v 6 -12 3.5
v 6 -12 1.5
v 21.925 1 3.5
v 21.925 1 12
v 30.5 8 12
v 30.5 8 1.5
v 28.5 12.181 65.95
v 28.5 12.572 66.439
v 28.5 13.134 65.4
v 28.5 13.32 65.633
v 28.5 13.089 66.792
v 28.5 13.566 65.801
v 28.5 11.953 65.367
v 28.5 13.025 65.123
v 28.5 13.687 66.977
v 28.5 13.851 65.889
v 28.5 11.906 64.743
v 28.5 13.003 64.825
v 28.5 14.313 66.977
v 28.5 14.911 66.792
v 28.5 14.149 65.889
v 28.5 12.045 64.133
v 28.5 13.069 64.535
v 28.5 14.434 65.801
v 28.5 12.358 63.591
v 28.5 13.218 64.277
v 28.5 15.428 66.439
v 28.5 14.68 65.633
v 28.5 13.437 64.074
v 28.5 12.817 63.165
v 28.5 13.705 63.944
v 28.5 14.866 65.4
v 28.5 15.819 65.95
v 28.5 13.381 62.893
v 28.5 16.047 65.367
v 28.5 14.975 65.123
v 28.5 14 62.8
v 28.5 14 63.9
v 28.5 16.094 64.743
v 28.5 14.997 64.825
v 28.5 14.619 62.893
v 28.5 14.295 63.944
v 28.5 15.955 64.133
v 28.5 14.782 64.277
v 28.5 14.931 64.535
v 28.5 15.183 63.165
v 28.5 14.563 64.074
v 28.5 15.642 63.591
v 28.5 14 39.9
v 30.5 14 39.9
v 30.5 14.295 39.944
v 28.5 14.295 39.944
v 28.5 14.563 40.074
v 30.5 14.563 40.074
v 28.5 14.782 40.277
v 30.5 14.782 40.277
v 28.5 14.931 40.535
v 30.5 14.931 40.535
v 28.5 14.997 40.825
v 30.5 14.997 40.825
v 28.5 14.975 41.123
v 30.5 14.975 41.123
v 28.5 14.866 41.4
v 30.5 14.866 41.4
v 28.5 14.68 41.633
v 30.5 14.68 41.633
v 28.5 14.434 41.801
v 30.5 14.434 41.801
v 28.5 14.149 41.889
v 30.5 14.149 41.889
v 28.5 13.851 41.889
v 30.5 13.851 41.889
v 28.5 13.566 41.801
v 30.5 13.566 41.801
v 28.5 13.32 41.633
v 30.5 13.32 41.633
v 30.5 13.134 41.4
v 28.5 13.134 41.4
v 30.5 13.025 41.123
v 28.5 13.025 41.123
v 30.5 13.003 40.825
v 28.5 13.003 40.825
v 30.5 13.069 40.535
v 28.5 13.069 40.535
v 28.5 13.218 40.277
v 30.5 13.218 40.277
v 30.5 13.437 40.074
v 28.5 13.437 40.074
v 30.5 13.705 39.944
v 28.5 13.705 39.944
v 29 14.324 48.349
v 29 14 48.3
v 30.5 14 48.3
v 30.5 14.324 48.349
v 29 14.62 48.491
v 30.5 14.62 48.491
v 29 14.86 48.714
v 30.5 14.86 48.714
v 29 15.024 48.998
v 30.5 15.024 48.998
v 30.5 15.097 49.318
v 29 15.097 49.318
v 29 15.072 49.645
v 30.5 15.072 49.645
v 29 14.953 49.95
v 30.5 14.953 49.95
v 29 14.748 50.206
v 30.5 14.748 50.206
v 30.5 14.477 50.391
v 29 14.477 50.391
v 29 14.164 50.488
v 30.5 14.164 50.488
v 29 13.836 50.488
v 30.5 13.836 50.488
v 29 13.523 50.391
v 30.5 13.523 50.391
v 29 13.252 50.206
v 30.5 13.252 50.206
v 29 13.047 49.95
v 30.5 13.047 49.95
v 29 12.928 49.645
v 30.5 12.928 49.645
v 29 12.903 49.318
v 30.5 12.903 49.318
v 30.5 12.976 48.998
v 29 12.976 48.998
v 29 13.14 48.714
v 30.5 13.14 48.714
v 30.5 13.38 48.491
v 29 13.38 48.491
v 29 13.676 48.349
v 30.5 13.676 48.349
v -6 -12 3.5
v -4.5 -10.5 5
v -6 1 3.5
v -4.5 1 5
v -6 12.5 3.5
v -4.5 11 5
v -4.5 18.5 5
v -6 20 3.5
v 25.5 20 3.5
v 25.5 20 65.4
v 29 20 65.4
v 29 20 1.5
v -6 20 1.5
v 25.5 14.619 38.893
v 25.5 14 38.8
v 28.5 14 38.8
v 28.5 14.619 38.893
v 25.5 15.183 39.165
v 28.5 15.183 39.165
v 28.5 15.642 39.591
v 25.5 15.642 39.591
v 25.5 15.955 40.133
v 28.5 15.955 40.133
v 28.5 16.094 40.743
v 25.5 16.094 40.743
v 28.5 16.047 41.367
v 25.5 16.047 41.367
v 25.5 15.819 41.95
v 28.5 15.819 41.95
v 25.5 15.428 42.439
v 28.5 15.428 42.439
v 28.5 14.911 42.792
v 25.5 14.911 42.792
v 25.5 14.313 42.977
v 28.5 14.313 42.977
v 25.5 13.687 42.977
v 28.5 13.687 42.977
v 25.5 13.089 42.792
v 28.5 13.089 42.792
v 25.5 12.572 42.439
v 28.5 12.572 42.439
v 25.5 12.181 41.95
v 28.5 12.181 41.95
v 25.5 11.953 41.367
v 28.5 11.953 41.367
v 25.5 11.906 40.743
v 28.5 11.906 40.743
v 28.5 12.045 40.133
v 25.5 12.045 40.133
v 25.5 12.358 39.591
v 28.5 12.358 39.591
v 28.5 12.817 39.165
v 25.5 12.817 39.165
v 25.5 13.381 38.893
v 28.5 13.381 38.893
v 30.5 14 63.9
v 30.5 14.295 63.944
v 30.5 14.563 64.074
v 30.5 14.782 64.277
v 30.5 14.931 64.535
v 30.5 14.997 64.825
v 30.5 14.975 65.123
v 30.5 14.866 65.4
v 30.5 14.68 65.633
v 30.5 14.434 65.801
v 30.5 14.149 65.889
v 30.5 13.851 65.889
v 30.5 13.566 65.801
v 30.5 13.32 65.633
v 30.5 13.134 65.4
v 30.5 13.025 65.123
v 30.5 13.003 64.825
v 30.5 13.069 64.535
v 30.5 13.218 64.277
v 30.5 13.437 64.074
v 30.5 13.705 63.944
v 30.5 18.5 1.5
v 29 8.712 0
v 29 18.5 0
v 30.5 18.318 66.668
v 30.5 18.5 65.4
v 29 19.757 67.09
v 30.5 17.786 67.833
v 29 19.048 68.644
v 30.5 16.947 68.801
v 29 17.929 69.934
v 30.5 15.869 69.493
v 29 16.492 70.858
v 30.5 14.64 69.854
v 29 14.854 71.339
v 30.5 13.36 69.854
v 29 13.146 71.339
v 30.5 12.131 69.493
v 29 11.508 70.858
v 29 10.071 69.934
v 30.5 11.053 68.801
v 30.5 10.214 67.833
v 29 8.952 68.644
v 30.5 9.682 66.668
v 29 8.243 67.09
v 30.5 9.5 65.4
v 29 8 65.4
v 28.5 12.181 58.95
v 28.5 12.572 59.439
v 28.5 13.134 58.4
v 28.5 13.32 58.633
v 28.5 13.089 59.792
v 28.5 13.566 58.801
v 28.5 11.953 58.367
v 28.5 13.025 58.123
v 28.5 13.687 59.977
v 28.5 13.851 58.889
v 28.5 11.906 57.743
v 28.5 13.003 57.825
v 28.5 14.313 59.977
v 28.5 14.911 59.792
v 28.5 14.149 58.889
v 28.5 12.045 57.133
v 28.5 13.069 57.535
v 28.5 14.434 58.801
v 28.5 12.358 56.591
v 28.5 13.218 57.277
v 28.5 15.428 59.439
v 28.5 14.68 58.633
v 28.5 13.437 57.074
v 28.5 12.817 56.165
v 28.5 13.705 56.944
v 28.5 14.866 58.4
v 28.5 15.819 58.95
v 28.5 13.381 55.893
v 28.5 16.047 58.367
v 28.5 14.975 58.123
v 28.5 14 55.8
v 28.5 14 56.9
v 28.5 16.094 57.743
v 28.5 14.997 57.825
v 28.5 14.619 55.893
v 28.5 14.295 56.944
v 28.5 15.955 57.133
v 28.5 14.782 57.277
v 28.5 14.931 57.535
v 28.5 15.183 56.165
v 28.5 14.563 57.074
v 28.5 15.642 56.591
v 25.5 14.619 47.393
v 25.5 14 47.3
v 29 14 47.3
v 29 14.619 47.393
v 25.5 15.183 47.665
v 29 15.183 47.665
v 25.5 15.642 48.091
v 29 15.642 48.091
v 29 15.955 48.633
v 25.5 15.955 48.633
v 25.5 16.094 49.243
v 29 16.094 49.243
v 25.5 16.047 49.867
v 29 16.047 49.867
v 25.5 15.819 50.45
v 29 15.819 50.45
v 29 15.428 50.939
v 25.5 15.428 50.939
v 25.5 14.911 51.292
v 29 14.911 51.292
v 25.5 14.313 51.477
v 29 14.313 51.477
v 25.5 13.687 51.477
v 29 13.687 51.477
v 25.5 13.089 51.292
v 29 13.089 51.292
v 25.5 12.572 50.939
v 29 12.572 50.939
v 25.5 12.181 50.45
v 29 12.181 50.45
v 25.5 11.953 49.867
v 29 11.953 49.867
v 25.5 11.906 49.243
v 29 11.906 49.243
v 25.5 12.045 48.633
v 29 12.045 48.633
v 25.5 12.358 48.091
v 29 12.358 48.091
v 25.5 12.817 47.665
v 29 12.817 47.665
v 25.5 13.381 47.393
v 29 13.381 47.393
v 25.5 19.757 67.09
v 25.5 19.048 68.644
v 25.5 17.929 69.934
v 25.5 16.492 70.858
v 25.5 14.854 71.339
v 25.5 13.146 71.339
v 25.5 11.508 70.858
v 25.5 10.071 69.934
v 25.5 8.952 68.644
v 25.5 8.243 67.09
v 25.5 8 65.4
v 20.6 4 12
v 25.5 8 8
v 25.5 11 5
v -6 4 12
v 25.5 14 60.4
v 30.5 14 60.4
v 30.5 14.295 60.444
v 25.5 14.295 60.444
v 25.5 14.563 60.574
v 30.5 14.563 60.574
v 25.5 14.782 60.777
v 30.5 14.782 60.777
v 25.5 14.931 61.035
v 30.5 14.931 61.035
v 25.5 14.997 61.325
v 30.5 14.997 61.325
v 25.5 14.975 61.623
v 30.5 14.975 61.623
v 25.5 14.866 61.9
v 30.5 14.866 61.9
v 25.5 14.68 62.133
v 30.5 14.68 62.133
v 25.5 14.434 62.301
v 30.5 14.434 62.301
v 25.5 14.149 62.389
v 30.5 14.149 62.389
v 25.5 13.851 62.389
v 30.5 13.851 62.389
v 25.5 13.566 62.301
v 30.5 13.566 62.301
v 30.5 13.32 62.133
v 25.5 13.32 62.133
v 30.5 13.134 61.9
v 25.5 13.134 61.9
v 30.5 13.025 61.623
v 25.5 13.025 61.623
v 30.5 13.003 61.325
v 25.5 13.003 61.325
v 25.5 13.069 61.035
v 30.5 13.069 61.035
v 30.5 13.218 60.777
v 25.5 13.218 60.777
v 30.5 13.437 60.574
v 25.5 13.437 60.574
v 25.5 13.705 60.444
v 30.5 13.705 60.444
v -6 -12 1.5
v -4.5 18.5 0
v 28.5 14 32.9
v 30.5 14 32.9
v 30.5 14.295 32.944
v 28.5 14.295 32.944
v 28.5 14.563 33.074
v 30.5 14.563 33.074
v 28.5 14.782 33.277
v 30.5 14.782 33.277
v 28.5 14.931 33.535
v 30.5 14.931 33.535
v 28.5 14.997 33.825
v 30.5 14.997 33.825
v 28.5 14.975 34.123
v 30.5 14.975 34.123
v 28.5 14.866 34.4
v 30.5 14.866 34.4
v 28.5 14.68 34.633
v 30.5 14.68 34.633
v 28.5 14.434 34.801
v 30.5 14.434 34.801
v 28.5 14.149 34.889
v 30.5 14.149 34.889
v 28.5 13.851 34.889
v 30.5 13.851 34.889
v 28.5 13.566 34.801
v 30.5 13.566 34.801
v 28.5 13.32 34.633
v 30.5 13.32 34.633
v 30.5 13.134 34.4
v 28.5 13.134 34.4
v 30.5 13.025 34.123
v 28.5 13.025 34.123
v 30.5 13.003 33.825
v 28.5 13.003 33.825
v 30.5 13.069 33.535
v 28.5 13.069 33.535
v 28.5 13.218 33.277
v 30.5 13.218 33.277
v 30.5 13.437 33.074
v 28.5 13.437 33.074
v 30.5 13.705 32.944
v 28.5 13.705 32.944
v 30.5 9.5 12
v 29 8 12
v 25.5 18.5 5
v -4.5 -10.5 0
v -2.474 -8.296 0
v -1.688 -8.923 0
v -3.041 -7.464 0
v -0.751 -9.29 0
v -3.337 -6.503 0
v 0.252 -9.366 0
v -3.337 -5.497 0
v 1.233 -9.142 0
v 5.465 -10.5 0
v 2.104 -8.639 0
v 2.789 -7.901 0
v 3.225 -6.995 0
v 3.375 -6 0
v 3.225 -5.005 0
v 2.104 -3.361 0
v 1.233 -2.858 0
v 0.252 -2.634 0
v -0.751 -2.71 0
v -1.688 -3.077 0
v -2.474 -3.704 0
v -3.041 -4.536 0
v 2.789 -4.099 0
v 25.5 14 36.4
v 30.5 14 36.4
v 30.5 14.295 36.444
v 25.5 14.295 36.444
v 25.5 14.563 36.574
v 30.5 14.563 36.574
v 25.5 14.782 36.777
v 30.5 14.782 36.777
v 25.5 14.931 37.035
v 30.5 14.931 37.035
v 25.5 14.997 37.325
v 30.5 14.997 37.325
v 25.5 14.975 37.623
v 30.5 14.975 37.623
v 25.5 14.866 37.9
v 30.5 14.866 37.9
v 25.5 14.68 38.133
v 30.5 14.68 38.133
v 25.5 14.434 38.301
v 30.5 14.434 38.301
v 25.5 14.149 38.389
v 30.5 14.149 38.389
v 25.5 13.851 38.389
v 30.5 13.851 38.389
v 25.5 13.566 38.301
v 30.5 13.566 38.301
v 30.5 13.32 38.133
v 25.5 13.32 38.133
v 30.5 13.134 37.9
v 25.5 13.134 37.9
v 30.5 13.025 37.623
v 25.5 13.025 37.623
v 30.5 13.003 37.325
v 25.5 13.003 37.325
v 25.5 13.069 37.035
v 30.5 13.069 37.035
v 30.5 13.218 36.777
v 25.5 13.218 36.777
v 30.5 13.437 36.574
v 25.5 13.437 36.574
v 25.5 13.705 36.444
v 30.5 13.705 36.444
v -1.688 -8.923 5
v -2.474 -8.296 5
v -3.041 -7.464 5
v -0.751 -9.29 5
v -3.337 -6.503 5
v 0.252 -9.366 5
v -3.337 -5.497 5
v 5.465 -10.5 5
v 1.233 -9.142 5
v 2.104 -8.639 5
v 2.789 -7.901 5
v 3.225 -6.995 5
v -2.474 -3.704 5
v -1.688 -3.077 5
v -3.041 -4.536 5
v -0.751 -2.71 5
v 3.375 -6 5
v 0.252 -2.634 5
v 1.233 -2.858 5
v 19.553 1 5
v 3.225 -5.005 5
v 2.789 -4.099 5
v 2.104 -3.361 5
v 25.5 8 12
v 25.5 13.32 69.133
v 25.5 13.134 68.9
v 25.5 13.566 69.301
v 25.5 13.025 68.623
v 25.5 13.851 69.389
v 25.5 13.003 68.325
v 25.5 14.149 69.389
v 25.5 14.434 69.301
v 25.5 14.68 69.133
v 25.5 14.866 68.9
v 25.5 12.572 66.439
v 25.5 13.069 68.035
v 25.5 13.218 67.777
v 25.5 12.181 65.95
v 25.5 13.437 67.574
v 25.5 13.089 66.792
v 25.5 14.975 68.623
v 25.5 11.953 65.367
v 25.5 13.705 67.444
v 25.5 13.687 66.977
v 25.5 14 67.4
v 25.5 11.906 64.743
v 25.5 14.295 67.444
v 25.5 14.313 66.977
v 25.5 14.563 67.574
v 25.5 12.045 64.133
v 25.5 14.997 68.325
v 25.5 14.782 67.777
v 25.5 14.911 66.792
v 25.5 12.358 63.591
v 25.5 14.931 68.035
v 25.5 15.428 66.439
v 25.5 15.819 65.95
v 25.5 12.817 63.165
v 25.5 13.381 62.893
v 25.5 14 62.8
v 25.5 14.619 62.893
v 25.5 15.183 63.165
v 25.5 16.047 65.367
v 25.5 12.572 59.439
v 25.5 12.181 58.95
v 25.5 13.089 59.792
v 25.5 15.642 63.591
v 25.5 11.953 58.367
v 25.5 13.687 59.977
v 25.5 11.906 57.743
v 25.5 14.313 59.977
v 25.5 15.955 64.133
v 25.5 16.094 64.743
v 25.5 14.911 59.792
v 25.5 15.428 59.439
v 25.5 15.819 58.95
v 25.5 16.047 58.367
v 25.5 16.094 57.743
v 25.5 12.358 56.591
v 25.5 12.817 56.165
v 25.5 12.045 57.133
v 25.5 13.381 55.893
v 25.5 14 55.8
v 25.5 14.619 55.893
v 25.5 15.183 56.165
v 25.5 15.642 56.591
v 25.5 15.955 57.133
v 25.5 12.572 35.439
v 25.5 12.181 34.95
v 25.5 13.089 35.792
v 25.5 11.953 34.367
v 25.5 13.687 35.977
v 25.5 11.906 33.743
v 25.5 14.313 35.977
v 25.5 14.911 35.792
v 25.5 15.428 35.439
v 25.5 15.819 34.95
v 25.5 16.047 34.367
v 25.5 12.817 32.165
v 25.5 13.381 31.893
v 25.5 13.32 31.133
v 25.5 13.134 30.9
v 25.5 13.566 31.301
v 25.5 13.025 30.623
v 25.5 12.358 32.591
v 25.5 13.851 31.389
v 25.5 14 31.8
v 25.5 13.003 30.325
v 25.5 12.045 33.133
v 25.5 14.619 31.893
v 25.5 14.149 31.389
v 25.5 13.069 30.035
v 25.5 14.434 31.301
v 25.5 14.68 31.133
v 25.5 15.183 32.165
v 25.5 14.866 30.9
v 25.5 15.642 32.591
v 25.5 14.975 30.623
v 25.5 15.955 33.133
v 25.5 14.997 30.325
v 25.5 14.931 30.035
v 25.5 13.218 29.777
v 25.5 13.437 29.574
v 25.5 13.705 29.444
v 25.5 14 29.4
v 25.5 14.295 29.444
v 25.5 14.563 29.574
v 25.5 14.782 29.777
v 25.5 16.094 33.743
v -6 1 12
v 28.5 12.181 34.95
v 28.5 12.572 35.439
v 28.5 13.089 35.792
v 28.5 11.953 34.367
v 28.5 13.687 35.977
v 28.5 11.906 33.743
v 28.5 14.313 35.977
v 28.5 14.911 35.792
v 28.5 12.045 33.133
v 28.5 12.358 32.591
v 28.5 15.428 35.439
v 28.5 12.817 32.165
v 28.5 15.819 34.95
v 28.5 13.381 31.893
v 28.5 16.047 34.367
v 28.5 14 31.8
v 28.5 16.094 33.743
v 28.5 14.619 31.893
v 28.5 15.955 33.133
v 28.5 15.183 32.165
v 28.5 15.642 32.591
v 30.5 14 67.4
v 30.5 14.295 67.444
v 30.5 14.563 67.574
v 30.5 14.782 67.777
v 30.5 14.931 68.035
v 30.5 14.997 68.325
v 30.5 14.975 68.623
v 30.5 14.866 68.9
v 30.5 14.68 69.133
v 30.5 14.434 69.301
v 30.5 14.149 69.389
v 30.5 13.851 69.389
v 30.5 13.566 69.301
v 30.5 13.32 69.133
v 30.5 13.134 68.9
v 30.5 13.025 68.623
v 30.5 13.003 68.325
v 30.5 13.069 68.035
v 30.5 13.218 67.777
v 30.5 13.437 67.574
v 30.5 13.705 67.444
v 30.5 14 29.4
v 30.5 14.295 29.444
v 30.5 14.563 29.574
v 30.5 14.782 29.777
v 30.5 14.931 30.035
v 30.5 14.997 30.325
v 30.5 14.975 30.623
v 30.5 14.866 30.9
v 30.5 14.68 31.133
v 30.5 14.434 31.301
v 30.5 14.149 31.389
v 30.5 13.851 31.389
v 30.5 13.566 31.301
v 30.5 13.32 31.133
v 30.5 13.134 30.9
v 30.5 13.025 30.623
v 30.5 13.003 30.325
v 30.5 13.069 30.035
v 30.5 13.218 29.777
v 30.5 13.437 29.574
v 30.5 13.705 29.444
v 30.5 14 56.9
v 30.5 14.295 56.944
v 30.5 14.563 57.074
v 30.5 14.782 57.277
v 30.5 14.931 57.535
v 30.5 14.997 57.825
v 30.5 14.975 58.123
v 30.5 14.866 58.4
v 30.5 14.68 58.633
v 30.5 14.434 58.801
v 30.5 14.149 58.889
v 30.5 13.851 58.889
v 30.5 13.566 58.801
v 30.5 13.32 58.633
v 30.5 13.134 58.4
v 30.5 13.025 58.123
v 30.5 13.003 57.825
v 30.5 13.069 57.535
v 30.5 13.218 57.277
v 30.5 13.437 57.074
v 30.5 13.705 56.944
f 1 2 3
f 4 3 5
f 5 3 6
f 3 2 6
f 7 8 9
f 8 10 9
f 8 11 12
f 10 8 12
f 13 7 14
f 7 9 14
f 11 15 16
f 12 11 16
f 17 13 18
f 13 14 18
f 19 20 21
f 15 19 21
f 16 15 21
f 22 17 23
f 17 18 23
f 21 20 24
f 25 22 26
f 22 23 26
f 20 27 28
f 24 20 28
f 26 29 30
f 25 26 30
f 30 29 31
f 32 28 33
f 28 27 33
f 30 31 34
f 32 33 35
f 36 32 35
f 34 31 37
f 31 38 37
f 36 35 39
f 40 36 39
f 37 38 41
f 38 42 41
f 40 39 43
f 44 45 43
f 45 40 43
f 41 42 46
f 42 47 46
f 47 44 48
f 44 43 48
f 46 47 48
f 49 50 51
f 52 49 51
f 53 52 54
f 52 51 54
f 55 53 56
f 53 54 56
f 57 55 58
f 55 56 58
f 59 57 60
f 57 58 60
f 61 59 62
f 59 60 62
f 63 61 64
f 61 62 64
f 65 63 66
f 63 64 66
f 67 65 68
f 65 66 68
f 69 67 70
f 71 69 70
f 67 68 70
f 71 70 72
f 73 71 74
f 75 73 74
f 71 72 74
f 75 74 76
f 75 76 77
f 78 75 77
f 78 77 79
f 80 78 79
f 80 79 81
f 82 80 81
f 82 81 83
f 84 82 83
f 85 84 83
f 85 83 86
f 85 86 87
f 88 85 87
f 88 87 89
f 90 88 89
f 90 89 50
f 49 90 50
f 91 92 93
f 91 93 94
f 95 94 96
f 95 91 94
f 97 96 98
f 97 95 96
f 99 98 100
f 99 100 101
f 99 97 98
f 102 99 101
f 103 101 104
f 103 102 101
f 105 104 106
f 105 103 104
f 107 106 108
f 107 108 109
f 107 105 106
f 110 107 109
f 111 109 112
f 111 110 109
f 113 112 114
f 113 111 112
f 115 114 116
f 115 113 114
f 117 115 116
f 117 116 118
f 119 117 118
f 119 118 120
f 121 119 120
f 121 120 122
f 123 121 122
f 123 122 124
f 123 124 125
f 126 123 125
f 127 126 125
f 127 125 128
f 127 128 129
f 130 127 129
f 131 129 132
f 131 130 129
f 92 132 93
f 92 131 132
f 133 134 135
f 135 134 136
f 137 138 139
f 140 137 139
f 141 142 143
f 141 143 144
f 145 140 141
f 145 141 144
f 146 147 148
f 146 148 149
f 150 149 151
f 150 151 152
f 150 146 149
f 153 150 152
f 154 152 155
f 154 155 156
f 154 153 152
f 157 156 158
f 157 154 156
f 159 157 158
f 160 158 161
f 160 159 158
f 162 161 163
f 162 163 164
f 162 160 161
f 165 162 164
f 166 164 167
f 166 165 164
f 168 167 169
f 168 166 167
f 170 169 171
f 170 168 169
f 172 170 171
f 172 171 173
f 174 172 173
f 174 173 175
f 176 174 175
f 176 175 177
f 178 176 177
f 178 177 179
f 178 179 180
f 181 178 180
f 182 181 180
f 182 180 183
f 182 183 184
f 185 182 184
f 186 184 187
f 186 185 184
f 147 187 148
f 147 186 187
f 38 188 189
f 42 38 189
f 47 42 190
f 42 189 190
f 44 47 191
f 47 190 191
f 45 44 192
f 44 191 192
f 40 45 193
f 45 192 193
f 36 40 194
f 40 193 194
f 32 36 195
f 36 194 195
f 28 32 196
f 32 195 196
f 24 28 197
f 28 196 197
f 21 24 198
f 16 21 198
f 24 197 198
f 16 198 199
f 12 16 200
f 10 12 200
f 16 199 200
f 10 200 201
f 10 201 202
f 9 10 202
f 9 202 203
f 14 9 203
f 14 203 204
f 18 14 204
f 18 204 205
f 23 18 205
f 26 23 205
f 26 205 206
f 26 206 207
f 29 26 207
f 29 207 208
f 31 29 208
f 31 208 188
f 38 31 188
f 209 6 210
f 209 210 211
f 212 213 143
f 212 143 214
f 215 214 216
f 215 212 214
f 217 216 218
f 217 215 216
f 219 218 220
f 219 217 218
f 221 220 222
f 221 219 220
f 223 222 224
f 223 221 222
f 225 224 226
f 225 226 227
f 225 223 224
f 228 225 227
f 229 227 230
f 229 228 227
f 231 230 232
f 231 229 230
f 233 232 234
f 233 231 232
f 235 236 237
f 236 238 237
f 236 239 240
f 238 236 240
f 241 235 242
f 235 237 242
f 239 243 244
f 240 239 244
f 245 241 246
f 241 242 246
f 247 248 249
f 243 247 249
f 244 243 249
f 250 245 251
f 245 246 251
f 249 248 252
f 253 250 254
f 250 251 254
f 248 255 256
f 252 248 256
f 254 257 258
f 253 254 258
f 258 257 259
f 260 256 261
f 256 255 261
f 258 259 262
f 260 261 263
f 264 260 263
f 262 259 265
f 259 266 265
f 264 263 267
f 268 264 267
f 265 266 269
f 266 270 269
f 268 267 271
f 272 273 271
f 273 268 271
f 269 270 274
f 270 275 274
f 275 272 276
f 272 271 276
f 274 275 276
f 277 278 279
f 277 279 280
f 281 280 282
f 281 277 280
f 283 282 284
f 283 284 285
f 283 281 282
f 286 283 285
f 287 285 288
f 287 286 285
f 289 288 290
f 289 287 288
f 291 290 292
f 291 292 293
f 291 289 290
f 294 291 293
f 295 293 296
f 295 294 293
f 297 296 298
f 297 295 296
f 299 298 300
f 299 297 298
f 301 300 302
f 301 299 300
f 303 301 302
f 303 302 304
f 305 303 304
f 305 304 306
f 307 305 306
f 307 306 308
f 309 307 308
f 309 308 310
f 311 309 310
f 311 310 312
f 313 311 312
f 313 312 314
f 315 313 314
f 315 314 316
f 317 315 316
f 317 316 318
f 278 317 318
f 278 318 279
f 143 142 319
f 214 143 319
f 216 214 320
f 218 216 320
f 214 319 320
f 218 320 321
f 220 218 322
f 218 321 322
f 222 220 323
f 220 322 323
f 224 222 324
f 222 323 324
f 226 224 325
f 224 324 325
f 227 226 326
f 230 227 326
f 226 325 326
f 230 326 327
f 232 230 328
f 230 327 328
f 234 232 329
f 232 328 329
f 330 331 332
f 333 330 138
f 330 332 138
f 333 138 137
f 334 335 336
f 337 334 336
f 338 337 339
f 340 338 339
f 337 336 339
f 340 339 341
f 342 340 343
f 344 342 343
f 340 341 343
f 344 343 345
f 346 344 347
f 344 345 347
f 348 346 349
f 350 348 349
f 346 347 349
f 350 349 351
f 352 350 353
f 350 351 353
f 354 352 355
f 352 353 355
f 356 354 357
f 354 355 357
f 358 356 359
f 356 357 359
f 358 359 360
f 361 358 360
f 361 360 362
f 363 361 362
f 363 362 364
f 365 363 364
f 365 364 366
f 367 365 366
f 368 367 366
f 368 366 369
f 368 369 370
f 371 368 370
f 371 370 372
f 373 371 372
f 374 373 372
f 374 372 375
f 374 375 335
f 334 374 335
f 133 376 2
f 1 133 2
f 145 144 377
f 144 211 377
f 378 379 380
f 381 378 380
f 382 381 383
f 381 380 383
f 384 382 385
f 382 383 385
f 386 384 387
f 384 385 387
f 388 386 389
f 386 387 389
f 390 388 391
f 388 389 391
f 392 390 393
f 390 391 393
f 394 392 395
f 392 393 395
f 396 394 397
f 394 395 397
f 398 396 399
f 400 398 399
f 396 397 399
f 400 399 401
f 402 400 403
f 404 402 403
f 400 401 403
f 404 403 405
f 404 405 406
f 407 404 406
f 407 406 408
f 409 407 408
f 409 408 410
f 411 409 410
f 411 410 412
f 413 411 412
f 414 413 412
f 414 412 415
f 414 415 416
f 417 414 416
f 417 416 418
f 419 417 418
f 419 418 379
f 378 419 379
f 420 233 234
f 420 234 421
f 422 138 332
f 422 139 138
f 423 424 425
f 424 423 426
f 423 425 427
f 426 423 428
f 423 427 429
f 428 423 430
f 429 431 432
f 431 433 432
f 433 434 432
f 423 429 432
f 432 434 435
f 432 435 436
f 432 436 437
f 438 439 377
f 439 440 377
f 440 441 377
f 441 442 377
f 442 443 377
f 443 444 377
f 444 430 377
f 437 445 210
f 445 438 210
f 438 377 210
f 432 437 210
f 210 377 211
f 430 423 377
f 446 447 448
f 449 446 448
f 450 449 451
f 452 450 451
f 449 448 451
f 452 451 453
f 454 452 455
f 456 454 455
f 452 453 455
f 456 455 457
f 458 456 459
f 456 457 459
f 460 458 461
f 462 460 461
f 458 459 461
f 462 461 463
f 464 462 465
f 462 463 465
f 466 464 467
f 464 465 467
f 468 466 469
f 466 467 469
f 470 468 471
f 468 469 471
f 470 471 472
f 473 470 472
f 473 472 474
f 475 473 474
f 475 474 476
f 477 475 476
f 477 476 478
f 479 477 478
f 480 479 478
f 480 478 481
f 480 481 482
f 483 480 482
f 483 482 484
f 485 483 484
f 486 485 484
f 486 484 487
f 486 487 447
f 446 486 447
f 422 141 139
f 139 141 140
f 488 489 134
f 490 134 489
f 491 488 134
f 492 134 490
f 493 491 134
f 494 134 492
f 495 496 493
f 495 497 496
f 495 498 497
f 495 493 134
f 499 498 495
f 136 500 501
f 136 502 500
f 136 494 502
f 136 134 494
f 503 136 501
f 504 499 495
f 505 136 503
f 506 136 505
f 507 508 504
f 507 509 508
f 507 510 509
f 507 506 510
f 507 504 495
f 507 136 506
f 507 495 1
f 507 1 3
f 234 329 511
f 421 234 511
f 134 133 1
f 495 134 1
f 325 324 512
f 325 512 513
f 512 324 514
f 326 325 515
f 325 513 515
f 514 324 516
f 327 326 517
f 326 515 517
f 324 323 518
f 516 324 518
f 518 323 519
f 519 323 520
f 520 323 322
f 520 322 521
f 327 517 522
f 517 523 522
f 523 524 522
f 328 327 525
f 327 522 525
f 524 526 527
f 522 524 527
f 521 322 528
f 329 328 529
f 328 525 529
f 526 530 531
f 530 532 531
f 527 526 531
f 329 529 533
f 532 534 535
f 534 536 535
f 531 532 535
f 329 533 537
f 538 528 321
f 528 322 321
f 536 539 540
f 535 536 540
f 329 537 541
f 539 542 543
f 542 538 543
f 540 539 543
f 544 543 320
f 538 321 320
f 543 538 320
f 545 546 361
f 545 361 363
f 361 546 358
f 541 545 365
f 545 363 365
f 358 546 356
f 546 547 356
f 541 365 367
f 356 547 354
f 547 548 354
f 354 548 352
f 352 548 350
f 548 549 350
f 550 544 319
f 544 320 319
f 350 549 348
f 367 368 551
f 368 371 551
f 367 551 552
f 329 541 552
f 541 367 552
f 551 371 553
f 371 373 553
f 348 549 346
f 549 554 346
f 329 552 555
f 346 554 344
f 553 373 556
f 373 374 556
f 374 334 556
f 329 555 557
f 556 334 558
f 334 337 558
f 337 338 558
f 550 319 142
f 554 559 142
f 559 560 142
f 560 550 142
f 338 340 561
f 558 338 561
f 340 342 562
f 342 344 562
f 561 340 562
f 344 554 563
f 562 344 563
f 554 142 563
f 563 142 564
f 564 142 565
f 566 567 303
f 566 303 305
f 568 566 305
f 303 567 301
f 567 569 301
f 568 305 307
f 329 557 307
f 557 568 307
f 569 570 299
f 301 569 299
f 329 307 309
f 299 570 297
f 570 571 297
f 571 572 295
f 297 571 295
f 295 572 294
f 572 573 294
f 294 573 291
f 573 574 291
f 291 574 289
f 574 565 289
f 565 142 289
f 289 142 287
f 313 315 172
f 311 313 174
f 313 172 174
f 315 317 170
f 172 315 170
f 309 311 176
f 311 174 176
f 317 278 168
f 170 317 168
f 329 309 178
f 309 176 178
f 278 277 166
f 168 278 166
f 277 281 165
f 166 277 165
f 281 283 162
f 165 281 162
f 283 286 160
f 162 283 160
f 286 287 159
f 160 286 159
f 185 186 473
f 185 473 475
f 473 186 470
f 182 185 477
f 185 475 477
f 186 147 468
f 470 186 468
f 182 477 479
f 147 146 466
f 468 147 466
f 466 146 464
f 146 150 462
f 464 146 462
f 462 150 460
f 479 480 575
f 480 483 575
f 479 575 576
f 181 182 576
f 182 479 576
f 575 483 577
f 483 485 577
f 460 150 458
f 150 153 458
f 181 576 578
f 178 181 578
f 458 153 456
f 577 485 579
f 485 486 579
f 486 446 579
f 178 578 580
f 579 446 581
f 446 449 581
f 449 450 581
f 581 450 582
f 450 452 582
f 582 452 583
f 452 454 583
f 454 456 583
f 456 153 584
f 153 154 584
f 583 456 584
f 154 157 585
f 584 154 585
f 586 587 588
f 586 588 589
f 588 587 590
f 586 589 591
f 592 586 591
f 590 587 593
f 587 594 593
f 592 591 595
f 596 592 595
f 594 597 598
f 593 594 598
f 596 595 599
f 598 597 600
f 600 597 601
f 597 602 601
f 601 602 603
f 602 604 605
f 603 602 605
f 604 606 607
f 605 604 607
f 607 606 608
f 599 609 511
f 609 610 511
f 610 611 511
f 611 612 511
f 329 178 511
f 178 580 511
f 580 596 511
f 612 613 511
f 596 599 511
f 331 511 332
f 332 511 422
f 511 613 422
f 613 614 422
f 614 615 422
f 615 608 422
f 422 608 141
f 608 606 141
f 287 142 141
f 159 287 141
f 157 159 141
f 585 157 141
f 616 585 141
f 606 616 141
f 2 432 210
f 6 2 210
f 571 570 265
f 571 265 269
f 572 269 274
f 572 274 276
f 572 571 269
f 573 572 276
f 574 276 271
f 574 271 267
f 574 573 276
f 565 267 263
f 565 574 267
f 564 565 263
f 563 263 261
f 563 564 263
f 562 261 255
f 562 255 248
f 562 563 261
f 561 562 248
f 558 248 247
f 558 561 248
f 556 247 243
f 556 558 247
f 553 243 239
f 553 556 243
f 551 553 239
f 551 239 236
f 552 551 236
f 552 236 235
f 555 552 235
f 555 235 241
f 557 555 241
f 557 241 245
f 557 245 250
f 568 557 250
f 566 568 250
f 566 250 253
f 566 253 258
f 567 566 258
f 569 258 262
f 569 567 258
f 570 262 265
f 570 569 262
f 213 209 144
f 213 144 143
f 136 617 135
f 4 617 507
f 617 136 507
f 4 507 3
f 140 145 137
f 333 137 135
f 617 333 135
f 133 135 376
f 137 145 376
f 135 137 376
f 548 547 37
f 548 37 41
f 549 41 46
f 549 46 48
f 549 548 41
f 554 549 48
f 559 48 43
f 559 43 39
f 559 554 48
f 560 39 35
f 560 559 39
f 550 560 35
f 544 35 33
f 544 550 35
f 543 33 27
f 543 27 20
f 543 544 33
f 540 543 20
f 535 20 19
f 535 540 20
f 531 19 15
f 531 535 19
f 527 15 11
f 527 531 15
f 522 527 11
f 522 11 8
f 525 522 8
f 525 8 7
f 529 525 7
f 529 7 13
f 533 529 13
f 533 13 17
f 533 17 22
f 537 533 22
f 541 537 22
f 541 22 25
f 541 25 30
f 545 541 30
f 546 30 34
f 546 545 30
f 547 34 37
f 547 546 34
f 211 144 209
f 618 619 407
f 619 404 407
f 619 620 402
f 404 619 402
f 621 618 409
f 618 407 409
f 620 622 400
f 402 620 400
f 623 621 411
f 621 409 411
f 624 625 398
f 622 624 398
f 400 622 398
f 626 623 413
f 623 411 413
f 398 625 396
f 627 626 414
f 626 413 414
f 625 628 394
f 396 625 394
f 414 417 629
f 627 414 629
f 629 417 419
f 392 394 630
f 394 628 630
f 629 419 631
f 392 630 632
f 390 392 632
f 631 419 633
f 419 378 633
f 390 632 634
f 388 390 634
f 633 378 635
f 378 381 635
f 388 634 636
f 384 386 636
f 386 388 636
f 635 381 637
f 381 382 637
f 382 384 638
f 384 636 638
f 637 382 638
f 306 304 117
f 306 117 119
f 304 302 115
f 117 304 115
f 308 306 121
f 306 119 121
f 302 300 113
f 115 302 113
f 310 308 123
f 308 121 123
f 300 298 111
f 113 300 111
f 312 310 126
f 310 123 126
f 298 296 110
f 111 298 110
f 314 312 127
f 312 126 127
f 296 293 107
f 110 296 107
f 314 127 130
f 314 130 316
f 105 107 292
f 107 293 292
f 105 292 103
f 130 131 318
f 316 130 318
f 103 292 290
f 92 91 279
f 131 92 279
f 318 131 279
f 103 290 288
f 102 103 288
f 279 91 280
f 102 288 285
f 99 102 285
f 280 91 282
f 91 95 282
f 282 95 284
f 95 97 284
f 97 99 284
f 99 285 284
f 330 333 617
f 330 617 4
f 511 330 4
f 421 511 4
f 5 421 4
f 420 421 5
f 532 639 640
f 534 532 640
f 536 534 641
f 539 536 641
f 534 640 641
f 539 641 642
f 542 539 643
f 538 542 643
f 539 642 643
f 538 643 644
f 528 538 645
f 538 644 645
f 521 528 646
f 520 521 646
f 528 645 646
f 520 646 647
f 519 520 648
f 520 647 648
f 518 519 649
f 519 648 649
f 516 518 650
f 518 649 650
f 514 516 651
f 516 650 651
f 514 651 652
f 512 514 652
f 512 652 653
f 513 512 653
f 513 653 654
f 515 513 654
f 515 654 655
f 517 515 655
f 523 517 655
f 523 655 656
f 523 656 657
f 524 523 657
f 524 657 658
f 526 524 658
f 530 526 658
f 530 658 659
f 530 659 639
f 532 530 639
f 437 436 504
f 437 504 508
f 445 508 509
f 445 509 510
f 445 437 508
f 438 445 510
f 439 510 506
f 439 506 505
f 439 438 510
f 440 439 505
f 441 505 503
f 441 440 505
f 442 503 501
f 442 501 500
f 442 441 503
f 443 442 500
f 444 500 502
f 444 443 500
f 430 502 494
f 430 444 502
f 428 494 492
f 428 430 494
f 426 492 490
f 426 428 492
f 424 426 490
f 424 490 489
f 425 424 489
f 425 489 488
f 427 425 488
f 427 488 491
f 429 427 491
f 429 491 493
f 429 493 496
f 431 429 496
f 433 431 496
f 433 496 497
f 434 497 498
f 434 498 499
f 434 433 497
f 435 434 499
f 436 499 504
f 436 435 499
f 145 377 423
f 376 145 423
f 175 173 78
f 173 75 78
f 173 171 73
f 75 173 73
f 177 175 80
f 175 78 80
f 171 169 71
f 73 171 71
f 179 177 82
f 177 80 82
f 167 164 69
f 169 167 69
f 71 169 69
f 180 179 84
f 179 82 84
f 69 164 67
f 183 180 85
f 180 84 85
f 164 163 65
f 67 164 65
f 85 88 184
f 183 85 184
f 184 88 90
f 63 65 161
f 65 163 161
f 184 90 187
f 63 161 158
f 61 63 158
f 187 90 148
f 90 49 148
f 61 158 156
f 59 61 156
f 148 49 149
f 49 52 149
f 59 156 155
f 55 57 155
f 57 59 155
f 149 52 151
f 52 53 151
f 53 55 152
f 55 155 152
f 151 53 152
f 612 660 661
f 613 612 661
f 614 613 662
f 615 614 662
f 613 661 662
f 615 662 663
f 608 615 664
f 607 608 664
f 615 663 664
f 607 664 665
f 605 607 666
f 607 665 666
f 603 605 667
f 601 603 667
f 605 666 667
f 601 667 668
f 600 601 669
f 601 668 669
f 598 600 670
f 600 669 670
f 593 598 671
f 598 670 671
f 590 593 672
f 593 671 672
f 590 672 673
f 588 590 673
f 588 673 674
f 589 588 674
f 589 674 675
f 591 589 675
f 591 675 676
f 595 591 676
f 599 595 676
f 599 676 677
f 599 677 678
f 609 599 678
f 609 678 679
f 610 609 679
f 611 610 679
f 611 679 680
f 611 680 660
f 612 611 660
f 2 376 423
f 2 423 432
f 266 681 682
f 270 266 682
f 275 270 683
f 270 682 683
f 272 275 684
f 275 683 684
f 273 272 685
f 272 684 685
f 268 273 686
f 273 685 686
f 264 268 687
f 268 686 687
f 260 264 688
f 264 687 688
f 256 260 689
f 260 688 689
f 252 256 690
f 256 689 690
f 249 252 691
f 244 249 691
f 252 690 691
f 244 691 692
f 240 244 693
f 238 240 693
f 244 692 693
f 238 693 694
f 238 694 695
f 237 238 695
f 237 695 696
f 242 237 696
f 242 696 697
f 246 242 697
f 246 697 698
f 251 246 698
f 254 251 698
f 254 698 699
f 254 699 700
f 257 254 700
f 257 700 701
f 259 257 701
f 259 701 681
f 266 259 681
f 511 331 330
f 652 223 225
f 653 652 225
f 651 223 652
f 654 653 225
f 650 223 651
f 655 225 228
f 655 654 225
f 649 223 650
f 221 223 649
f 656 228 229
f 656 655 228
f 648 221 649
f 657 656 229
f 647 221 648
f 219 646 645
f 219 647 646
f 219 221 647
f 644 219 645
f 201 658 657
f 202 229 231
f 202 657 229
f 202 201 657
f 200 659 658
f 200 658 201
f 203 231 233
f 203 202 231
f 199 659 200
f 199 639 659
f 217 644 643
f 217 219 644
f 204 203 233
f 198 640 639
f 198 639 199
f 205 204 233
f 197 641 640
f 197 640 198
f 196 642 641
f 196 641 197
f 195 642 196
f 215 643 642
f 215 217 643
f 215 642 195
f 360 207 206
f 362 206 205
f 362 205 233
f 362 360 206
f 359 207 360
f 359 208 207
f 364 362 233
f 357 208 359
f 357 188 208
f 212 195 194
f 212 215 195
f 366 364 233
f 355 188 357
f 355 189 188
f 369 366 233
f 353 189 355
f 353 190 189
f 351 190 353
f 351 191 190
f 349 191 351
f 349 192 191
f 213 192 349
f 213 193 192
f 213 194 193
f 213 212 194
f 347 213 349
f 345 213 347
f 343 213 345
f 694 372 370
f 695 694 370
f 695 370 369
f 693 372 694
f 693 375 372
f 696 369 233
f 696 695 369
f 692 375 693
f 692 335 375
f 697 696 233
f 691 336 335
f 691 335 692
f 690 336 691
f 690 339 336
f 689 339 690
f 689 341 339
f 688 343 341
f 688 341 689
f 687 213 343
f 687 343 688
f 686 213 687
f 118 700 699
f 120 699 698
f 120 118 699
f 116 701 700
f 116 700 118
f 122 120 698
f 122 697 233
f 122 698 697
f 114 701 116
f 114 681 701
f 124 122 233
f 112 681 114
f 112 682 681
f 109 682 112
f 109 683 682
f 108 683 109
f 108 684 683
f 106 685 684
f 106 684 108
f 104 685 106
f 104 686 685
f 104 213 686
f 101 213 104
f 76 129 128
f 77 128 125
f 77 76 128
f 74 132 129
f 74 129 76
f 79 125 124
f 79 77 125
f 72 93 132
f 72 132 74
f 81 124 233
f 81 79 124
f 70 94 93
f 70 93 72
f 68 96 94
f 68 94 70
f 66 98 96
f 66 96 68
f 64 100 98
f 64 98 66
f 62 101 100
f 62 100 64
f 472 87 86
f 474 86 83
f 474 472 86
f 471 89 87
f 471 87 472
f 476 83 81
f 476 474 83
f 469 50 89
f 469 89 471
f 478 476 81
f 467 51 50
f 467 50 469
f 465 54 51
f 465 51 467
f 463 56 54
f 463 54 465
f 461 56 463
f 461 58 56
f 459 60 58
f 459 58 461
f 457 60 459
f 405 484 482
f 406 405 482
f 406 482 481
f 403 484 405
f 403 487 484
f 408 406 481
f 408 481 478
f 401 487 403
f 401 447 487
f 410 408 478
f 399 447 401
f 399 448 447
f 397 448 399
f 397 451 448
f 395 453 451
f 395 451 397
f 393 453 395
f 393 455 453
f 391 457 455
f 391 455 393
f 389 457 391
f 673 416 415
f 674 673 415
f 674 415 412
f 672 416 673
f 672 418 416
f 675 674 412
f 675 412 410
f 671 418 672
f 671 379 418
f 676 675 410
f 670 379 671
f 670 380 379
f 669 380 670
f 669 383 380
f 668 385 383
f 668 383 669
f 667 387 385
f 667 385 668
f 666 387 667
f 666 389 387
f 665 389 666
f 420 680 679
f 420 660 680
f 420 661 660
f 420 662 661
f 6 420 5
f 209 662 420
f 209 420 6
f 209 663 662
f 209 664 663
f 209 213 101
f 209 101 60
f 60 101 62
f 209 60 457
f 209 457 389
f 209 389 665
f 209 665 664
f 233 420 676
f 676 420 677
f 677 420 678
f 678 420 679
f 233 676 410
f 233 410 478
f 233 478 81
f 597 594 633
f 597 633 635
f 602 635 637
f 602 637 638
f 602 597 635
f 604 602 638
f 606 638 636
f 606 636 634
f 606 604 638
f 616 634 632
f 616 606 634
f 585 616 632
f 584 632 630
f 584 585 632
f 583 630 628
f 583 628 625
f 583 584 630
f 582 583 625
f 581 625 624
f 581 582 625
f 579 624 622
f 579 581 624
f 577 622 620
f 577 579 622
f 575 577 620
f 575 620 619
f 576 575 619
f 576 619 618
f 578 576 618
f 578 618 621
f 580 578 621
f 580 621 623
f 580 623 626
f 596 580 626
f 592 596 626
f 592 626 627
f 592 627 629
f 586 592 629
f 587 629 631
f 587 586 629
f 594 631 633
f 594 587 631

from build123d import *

# Parameters (mm, degrees)
CROQUIS1_W              = 12
CROQUIS1_H              = 12
CROQUIS1_R              = 3.375
SALIENTE_EXTRUIR1_DEPTH = 5
CROQUIS2_W              = 71.4
CROQUIS2_H              = 12
CROQUIS2_R              = 2.1
SALIENTE_EXTRUIR2_DEPTH = 5
CORTAR_EXTRUIR1_REACH   = 84.645
CROQUIS4_R              = 1
CORTAR_EXTRUIR2_START   = -5
CROQUIS5_R              = 2.1
CORTAR_EXTRUIR2_DEPTH   = 3
SALIENTE_EXTRUIR4_START = -1.5
CROQUIS6_R              = 2.1
CROQUIS6_R_2            = 1.1
SALIENTE_EXTRUIR4_DEPTH = 1.5
REDONDEO2_R             = 6
SALIENTE_EXTRUIR5_DEPTH = 5
SALIENTE_EXTRUIR6_DEPTH = 7
CHAFL_N1_SIZE           = 7
CHAFL_N2_SIZE           = 1.5


# Some blends are built 0.0001 mm under size
with BuildPart() as part:
    # Croquis1 → Saliente-Extruir1 (new body)
    # profile 1 of 2: a face of its own
    with BuildSketch(Plane.XY):
        Polygon((25.5, 20), (-6, 20), (-6, 0), (6, 0), (6, 8), (25.5, 8), align=None)
    # profile 2 of 2: a face of its own
    with BuildSketch(Plane.XY):
        with Locations((0, -6)):
            Rectangle(CROQUIS1_W, CROQUIS1_H)
        with Locations((0, -6)):
            Circle(CROQUIS1_R, mode=Mode.SUBTRACT)
    extrude(amount=SALIENTE_EXTRUIR1_DEPTH)

    # Croquis2 → Saliente-Extruir2 (add)
    with BuildSketch(Plane(origin=(25.5, 0, 0), x_dir=(0, 0, -1), z_dir=(1, 0, 0))):
        with Locations((-35.7, 14)):
            Rectangle(CROQUIS2_W, CROQUIS2_H)
        with Locations((-49.4, 14)):
            Circle(CROQUIS2_R, mode=Mode.SUBTRACT)
    extrude(amount=SALIENTE_EXTRUIR2_DEPTH)

    # Croquis4 → Cortar-Extruir1 (cut, up to next)
    with BuildSketch(Plane(origin=(30.5, 0, 0), x_dir=(0, 0, -1), z_dir=(1, 0, 0)), mode=Mode.PRIVATE) as cortar_extruir1_sk1:
        with Locations((-68.4, 14)):
            Circle(CROQUIS4_R)
    cortar_extruir1_tool1 = extrude(cortar_extruir1_sk1.sketch, amount=-CORTAR_EXTRUIR1_REACH, mode=Mode.PRIVATE) & part.part
    # Croquis4 → Cortar-Extruir1 (cut, up to next)
    with BuildSketch(Plane(origin=(30.5, 0, 0), x_dir=(0, 0, -1), z_dir=(1, 0, 0)), mode=Mode.PRIVATE) as cortar_extruir1_sk2:
        with Locations((-64.9, 14)):
            Circle(CROQUIS4_R)
    cortar_extruir1_tool2 = extrude(cortar_extruir1_sk2.sketch, amount=-CORTAR_EXTRUIR1_REACH, mode=Mode.PRIVATE) & part.part
    # Croquis4 → Cortar-Extruir1 (cut, up to next)
    with BuildSketch(Plane(origin=(30.5, 0, 0), x_dir=(0, 0, -1), z_dir=(1, 0, 0)), mode=Mode.PRIVATE) as cortar_extruir1_sk3:
        with Locations((-61.4, 14)):
            Circle(CROQUIS4_R)
    cortar_extruir1_tool3 = extrude(cortar_extruir1_sk3.sketch, amount=-CORTAR_EXTRUIR1_REACH, mode=Mode.PRIVATE) & part.part
    # Croquis4 → Cortar-Extruir1 (cut, up to next)
    with BuildSketch(Plane(origin=(30.5, 0, 0), x_dir=(0, 0, -1), z_dir=(1, 0, 0)), mode=Mode.PRIVATE) as cortar_extruir1_sk4:
        with Locations((-57.9, 14)):
            Circle(CROQUIS4_R)
    cortar_extruir1_tool4 = extrude(cortar_extruir1_sk4.sketch, amount=-CORTAR_EXTRUIR1_REACH, mode=Mode.PRIVATE) & part.part
    # Croquis4 → Cortar-Extruir1 (cut, up to next)
    with BuildSketch(Plane(origin=(30.5, 0, 0), x_dir=(0, 0, -1), z_dir=(1, 0, 0)), mode=Mode.PRIVATE) as cortar_extruir1_sk5:
        with Locations((-40.9, 14)):
            Circle(CROQUIS4_R)
    cortar_extruir1_tool5 = extrude(cortar_extruir1_sk5.sketch, amount=-CORTAR_EXTRUIR1_REACH, mode=Mode.PRIVATE) & part.part
    # Croquis4 → Cortar-Extruir1 (cut, up to next)
    with BuildSketch(Plane(origin=(30.5, 0, 0), x_dir=(0, 0, -1), z_dir=(1, 0, 0)), mode=Mode.PRIVATE) as cortar_extruir1_sk6:
        with Locations((-37.4, 14)):
            Circle(CROQUIS4_R)
    cortar_extruir1_tool6 = extrude(cortar_extruir1_sk6.sketch, amount=-CORTAR_EXTRUIR1_REACH, mode=Mode.PRIVATE) & part.part
    # Croquis4 → Cortar-Extruir1 (cut, up to next)
    with BuildSketch(Plane(origin=(30.5, 0, 0), x_dir=(0, 0, -1), z_dir=(1, 0, 0)), mode=Mode.PRIVATE) as cortar_extruir1_sk7:
        with Locations((-33.9, 14)):
            Circle(CROQUIS4_R)
    cortar_extruir1_tool7 = extrude(cortar_extruir1_sk7.sketch, amount=-CORTAR_EXTRUIR1_REACH, mode=Mode.PRIVATE) & part.part
    # Croquis4 → Cortar-Extruir1 (cut, up to next)
    with BuildSketch(Plane(origin=(30.5, 0, 0), x_dir=(0, 0, -1), z_dir=(1, 0, 0)), mode=Mode.PRIVATE) as cortar_extruir1_sk8:
        with Locations((-30.4, 14)):
            Circle(CROQUIS4_R)
    cortar_extruir1_tool8 = extrude(cortar_extruir1_sk8.sketch, amount=-CORTAR_EXTRUIR1_REACH, mode=Mode.PRIVATE) & part.part
    add(cortar_extruir1_tool1.solids().sort_by_distance((30.5, 14, 68.4))[0], mode=Mode.SUBTRACT)
    add(cortar_extruir1_tool2.solids().sort_by_distance((30.5, 14, 64.9))[0], mode=Mode.SUBTRACT)
    add(cortar_extruir1_tool3.solids().sort_by_distance((30.5, 14, 61.4))[0], mode=Mode.SUBTRACT)
    add(cortar_extruir1_tool4.solids().sort_by_distance((30.5, 14, 57.9))[0], mode=Mode.SUBTRACT)
    add(cortar_extruir1_tool5.solids().sort_by_distance((30.5, 14, 40.9))[0], mode=Mode.SUBTRACT)
    add(cortar_extruir1_tool6.solids().sort_by_distance((30.5, 14, 37.4))[0], mode=Mode.SUBTRACT)
    add(cortar_extruir1_tool7.solids().sort_by_distance((30.5, 14, 33.9))[0], mode=Mode.SUBTRACT)
    add(cortar_extruir1_tool8.solids().sort_by_distance((30.5, 14, 30.4))[0], mode=Mode.SUBTRACT)

    # Croquis5 → Cortar-Extruir2 (cut)
    with BuildSketch(Plane(origin=(30.5, 0, 0), x_dir=(0, 0, -1), z_dir=(1, 0, 0)).offset(CORTAR_EXTRUIR2_START)):
        with Locations((-57.9, 14)):
            Circle(CROQUIS5_R)
        with Locations((-64.9, 14)):
            Circle(CROQUIS5_R)
        with Locations((-40.9, 14)):
            Circle(CROQUIS5_R)
        with Locations((-33.9, 14)):
            Circle(CROQUIS5_R)
    extrude(amount=CORTAR_EXTRUIR2_DEPTH, mode=Mode.SUBTRACT)

    # Croquis6 → Saliente-Extruir4 (add)
    with BuildSketch(Plane(origin=(30.5, 0, 0), x_dir=(0, 0, -1), z_dir=(1, 0, 0)).offset(SALIENTE_EXTRUIR4_START)):
        with Locations((-49.4, 14)):
            Circle(CROQUIS6_R)
        with Locations((-49.4, 14)):
            Circle(CROQUIS6_R_2, mode=Mode.SUBTRACT)
    extrude(amount=SALIENTE_EXTRUIR4_DEPTH)

    # Redondeo2
    # the kernel refuses this fillet: 6 mm, written as the material it takes off along each edge
    with BuildSketch(Plane(origin=(10.5, 20, 71.4), x_dir=(0, 0, -1), z_dir=(1, 0, 0)), Plane(origin=(10.5, 8, 71.4), x_dir=(0, 1, 0), z_dir=(1, 0, 0))) as redondeo2_piece_1:
        with BuildLine():
            CenterArc((REDONDEO2_R, -REDONDEO2_R), REDONDEO2_R, 90, 90)
            Line((0, -REDONDEO2_R), (0, 0))
            Line((0, 0), (REDONDEO2_R, 0))
        make_face()
    extrude(amount=35, mode=Mode.SUBTRACT)

    # Croquis10 → Saliente-Extruir5 (add)
    with BuildSketch(Plane(origin=(0, 0, 0), x_dir=(-1, 0, 0), z_dir=(0, 0, -1))):
        Polygon((-6, 8), (-6, -12), (-30.5, 8), align=None)
    extrude(amount=-SALIENTE_EXTRUIR5_DEPTH)

    # Croquis11 → Saliente-Extruir6 (add)
    with BuildSketch(Plane.XY.offset(5)):
        Polygon((-6, 1), (21.925, 1), (30.5, 8), (25.5, 8), (20.6, 4), (-6, 4), align=None)
    extrude(amount=SALIENTE_EXTRUIR6_DEPTH)

    # Chaflán1
    chafl_n1_edges = [part.edges().sort_by_distance(p)[0] for p in [
        (7.3, 4, 5),
    ]]
    chamfer(chafl_n1_edges, length=CHAFL_N1_SIZE - 0.0001)  # a hair under: the kernel refuses the full size

    # Chaflán2
    chafl_n2_edges = [part.edges().sort_by_distance(p)[0] for p in [
        (12.25, 20, 0),
        (30.5, 14, 71.4),
        (30.5, 14, 71.4),
        (18.25, -2, 0),
        (13.9625, -5.5, 5),
        (30.5, 8, 38.7),
        (-6, -5.5, 5),
        (9.75, 20, 5),
        (-6, 15.49995, 5),
        (30.5, 14, 0),
        (0, -12, 5),
        (30.5, 20, 32.7),
        (0, -12, 0),
        (-6, 4, 0),
    ]]
    chamfer(chafl_n2_edges, length=CHAFL_N2_SIZE)


solid = part.part
